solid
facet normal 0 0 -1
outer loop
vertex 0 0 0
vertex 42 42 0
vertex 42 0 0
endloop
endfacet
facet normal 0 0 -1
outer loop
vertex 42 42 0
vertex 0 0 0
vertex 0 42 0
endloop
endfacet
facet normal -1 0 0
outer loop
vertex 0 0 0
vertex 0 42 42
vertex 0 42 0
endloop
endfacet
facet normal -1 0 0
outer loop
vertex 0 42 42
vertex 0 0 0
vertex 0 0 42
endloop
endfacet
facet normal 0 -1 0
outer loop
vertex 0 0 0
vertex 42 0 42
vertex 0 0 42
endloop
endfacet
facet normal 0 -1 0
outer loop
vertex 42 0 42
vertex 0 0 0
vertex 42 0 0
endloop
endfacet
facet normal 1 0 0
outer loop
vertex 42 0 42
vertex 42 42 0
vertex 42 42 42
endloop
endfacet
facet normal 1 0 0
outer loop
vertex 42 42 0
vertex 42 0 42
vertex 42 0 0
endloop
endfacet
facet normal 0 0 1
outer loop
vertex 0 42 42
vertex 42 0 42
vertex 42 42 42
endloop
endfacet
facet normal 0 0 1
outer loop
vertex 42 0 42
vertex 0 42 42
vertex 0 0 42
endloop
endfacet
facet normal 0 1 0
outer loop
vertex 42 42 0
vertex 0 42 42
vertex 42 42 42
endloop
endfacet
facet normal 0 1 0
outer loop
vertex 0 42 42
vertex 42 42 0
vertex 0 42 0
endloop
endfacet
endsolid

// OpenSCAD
// file: lib/libdefs.scad
// Helper library for include_*/use_* cases (not a case itself).
libvar = 42;
echo("lib top-level echo");
function libf(x) = x * libvar;
module libm() { cube(libvar); }
cube(7);
// main file
include <lib/libdefs.scad>
echo("libf", libf(2));
echo("libvar", libvar);
libm();
